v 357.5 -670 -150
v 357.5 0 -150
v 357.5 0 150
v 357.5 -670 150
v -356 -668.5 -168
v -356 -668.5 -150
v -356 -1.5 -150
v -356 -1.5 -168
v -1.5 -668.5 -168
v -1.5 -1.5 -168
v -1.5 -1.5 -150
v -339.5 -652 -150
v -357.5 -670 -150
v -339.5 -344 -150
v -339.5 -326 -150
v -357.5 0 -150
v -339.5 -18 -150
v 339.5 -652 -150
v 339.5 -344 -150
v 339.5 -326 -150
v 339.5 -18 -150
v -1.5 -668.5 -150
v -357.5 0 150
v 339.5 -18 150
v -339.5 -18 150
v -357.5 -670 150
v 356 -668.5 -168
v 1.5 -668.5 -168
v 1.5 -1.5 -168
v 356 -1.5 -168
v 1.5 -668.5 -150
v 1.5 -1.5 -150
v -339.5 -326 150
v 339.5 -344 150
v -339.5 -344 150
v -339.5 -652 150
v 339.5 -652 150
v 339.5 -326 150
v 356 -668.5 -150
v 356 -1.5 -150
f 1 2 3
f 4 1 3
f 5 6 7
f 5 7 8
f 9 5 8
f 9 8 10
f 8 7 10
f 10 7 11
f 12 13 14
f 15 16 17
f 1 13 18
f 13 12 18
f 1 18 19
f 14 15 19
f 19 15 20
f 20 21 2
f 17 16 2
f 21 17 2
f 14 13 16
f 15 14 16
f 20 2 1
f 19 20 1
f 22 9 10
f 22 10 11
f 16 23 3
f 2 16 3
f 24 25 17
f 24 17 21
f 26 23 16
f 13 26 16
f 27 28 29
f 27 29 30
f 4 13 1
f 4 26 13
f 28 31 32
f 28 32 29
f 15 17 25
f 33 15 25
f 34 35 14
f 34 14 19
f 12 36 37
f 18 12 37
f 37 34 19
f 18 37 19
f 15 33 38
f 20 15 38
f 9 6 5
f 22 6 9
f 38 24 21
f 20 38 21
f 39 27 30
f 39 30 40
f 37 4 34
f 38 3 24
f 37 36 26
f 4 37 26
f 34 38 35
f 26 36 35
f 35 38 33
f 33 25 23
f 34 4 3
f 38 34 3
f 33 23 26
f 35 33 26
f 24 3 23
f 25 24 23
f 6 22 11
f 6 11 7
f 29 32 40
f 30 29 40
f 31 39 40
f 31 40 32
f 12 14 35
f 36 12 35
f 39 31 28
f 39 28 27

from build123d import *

# Parameters (mm, degrees)
F1_DEPTH  = 670
F3_W      = 679
F3_H      = 300
F4_DEPTH  = 18
F5_DEPTH  = 18
F7_W      = 679
F7_H      = 300
F8_DEPTH  = 9
F12_DEPTH = 667


with BuildPart() as f1:
    # F0 (on Front) → F1 (new body)
    with BuildSketch(Plane.XZ):
        Polygon((-356, -150), (-339.5, -150), (-339.5, 150), (-357.5, 150), (-357.5, -150), align=None)
    extrude(amount=F1_DEPTH)


with BuildPart() as f1b:
    # F0 (on Front) → F1, piece 2 (new body)
    with BuildSketch(Plane.XZ):
        Polygon((357.5, 150), (339.5, 150), (339.5, -150), (356, -150), (357.5, -150), align=None)
    extrude(amount=F1_DEPTH)


with BuildPart() as f4:
    # F3 (on offset) → F4 (new body)
    with BuildSketch(Plane.XZ.offset(670)):
        Rectangle(F3_W, F3_H)
    extrude(amount=-F4_DEPTH)


with BuildPart() as f5:
    # F0 (on Front) → F5 (new body)
    with BuildSketch(Plane.XZ):
        Polygon((-339.5, 150), (-339.5, -150), (-1.5, -150), (1.5, -150), (339.5, -150), (339.5, 150), align=None)
    extrude(amount=F5_DEPTH)


with BuildPart() as f8:
    # F7 (on offset) → F8 (new body, symmetric)
    with BuildSketch(Plane.XZ.offset(335)):
        Rectangle(F7_W, F7_H)
    extrude(amount=F8_DEPTH, both=True)


with BuildPart() as f1_1:
    add(f1.part)

    # F9: union F1b, F4, F5, F8
    add(f1b.part)
    add(f4.part)
    add(f5.part)
    add(f8.part)


with BuildPart() as f12:
    # F11 (on offset) → F12 (new body)
    with BuildSketch(Plane.XZ.offset(668.5)):
        Polygon((-1.5, -150), (-339.5, -150), (-356, -150), (-356, -168), (-1.5, -168), align=None)
    extrude(amount=-F12_DEPTH)


with BuildPart() as f12b:
    # F11 (on offset) → F12, piece 2 (new body)
    with BuildSketch(Plane.XZ.offset(668.5)):
        Polygon((339.5, -150), (1.5, -150), (1.5, -168), (356, -168), (356, -150), align=None)
    extrude(amount=-F12_DEPTH)


solid = Compound([f1_1.part, f12.part, f12b.part])
